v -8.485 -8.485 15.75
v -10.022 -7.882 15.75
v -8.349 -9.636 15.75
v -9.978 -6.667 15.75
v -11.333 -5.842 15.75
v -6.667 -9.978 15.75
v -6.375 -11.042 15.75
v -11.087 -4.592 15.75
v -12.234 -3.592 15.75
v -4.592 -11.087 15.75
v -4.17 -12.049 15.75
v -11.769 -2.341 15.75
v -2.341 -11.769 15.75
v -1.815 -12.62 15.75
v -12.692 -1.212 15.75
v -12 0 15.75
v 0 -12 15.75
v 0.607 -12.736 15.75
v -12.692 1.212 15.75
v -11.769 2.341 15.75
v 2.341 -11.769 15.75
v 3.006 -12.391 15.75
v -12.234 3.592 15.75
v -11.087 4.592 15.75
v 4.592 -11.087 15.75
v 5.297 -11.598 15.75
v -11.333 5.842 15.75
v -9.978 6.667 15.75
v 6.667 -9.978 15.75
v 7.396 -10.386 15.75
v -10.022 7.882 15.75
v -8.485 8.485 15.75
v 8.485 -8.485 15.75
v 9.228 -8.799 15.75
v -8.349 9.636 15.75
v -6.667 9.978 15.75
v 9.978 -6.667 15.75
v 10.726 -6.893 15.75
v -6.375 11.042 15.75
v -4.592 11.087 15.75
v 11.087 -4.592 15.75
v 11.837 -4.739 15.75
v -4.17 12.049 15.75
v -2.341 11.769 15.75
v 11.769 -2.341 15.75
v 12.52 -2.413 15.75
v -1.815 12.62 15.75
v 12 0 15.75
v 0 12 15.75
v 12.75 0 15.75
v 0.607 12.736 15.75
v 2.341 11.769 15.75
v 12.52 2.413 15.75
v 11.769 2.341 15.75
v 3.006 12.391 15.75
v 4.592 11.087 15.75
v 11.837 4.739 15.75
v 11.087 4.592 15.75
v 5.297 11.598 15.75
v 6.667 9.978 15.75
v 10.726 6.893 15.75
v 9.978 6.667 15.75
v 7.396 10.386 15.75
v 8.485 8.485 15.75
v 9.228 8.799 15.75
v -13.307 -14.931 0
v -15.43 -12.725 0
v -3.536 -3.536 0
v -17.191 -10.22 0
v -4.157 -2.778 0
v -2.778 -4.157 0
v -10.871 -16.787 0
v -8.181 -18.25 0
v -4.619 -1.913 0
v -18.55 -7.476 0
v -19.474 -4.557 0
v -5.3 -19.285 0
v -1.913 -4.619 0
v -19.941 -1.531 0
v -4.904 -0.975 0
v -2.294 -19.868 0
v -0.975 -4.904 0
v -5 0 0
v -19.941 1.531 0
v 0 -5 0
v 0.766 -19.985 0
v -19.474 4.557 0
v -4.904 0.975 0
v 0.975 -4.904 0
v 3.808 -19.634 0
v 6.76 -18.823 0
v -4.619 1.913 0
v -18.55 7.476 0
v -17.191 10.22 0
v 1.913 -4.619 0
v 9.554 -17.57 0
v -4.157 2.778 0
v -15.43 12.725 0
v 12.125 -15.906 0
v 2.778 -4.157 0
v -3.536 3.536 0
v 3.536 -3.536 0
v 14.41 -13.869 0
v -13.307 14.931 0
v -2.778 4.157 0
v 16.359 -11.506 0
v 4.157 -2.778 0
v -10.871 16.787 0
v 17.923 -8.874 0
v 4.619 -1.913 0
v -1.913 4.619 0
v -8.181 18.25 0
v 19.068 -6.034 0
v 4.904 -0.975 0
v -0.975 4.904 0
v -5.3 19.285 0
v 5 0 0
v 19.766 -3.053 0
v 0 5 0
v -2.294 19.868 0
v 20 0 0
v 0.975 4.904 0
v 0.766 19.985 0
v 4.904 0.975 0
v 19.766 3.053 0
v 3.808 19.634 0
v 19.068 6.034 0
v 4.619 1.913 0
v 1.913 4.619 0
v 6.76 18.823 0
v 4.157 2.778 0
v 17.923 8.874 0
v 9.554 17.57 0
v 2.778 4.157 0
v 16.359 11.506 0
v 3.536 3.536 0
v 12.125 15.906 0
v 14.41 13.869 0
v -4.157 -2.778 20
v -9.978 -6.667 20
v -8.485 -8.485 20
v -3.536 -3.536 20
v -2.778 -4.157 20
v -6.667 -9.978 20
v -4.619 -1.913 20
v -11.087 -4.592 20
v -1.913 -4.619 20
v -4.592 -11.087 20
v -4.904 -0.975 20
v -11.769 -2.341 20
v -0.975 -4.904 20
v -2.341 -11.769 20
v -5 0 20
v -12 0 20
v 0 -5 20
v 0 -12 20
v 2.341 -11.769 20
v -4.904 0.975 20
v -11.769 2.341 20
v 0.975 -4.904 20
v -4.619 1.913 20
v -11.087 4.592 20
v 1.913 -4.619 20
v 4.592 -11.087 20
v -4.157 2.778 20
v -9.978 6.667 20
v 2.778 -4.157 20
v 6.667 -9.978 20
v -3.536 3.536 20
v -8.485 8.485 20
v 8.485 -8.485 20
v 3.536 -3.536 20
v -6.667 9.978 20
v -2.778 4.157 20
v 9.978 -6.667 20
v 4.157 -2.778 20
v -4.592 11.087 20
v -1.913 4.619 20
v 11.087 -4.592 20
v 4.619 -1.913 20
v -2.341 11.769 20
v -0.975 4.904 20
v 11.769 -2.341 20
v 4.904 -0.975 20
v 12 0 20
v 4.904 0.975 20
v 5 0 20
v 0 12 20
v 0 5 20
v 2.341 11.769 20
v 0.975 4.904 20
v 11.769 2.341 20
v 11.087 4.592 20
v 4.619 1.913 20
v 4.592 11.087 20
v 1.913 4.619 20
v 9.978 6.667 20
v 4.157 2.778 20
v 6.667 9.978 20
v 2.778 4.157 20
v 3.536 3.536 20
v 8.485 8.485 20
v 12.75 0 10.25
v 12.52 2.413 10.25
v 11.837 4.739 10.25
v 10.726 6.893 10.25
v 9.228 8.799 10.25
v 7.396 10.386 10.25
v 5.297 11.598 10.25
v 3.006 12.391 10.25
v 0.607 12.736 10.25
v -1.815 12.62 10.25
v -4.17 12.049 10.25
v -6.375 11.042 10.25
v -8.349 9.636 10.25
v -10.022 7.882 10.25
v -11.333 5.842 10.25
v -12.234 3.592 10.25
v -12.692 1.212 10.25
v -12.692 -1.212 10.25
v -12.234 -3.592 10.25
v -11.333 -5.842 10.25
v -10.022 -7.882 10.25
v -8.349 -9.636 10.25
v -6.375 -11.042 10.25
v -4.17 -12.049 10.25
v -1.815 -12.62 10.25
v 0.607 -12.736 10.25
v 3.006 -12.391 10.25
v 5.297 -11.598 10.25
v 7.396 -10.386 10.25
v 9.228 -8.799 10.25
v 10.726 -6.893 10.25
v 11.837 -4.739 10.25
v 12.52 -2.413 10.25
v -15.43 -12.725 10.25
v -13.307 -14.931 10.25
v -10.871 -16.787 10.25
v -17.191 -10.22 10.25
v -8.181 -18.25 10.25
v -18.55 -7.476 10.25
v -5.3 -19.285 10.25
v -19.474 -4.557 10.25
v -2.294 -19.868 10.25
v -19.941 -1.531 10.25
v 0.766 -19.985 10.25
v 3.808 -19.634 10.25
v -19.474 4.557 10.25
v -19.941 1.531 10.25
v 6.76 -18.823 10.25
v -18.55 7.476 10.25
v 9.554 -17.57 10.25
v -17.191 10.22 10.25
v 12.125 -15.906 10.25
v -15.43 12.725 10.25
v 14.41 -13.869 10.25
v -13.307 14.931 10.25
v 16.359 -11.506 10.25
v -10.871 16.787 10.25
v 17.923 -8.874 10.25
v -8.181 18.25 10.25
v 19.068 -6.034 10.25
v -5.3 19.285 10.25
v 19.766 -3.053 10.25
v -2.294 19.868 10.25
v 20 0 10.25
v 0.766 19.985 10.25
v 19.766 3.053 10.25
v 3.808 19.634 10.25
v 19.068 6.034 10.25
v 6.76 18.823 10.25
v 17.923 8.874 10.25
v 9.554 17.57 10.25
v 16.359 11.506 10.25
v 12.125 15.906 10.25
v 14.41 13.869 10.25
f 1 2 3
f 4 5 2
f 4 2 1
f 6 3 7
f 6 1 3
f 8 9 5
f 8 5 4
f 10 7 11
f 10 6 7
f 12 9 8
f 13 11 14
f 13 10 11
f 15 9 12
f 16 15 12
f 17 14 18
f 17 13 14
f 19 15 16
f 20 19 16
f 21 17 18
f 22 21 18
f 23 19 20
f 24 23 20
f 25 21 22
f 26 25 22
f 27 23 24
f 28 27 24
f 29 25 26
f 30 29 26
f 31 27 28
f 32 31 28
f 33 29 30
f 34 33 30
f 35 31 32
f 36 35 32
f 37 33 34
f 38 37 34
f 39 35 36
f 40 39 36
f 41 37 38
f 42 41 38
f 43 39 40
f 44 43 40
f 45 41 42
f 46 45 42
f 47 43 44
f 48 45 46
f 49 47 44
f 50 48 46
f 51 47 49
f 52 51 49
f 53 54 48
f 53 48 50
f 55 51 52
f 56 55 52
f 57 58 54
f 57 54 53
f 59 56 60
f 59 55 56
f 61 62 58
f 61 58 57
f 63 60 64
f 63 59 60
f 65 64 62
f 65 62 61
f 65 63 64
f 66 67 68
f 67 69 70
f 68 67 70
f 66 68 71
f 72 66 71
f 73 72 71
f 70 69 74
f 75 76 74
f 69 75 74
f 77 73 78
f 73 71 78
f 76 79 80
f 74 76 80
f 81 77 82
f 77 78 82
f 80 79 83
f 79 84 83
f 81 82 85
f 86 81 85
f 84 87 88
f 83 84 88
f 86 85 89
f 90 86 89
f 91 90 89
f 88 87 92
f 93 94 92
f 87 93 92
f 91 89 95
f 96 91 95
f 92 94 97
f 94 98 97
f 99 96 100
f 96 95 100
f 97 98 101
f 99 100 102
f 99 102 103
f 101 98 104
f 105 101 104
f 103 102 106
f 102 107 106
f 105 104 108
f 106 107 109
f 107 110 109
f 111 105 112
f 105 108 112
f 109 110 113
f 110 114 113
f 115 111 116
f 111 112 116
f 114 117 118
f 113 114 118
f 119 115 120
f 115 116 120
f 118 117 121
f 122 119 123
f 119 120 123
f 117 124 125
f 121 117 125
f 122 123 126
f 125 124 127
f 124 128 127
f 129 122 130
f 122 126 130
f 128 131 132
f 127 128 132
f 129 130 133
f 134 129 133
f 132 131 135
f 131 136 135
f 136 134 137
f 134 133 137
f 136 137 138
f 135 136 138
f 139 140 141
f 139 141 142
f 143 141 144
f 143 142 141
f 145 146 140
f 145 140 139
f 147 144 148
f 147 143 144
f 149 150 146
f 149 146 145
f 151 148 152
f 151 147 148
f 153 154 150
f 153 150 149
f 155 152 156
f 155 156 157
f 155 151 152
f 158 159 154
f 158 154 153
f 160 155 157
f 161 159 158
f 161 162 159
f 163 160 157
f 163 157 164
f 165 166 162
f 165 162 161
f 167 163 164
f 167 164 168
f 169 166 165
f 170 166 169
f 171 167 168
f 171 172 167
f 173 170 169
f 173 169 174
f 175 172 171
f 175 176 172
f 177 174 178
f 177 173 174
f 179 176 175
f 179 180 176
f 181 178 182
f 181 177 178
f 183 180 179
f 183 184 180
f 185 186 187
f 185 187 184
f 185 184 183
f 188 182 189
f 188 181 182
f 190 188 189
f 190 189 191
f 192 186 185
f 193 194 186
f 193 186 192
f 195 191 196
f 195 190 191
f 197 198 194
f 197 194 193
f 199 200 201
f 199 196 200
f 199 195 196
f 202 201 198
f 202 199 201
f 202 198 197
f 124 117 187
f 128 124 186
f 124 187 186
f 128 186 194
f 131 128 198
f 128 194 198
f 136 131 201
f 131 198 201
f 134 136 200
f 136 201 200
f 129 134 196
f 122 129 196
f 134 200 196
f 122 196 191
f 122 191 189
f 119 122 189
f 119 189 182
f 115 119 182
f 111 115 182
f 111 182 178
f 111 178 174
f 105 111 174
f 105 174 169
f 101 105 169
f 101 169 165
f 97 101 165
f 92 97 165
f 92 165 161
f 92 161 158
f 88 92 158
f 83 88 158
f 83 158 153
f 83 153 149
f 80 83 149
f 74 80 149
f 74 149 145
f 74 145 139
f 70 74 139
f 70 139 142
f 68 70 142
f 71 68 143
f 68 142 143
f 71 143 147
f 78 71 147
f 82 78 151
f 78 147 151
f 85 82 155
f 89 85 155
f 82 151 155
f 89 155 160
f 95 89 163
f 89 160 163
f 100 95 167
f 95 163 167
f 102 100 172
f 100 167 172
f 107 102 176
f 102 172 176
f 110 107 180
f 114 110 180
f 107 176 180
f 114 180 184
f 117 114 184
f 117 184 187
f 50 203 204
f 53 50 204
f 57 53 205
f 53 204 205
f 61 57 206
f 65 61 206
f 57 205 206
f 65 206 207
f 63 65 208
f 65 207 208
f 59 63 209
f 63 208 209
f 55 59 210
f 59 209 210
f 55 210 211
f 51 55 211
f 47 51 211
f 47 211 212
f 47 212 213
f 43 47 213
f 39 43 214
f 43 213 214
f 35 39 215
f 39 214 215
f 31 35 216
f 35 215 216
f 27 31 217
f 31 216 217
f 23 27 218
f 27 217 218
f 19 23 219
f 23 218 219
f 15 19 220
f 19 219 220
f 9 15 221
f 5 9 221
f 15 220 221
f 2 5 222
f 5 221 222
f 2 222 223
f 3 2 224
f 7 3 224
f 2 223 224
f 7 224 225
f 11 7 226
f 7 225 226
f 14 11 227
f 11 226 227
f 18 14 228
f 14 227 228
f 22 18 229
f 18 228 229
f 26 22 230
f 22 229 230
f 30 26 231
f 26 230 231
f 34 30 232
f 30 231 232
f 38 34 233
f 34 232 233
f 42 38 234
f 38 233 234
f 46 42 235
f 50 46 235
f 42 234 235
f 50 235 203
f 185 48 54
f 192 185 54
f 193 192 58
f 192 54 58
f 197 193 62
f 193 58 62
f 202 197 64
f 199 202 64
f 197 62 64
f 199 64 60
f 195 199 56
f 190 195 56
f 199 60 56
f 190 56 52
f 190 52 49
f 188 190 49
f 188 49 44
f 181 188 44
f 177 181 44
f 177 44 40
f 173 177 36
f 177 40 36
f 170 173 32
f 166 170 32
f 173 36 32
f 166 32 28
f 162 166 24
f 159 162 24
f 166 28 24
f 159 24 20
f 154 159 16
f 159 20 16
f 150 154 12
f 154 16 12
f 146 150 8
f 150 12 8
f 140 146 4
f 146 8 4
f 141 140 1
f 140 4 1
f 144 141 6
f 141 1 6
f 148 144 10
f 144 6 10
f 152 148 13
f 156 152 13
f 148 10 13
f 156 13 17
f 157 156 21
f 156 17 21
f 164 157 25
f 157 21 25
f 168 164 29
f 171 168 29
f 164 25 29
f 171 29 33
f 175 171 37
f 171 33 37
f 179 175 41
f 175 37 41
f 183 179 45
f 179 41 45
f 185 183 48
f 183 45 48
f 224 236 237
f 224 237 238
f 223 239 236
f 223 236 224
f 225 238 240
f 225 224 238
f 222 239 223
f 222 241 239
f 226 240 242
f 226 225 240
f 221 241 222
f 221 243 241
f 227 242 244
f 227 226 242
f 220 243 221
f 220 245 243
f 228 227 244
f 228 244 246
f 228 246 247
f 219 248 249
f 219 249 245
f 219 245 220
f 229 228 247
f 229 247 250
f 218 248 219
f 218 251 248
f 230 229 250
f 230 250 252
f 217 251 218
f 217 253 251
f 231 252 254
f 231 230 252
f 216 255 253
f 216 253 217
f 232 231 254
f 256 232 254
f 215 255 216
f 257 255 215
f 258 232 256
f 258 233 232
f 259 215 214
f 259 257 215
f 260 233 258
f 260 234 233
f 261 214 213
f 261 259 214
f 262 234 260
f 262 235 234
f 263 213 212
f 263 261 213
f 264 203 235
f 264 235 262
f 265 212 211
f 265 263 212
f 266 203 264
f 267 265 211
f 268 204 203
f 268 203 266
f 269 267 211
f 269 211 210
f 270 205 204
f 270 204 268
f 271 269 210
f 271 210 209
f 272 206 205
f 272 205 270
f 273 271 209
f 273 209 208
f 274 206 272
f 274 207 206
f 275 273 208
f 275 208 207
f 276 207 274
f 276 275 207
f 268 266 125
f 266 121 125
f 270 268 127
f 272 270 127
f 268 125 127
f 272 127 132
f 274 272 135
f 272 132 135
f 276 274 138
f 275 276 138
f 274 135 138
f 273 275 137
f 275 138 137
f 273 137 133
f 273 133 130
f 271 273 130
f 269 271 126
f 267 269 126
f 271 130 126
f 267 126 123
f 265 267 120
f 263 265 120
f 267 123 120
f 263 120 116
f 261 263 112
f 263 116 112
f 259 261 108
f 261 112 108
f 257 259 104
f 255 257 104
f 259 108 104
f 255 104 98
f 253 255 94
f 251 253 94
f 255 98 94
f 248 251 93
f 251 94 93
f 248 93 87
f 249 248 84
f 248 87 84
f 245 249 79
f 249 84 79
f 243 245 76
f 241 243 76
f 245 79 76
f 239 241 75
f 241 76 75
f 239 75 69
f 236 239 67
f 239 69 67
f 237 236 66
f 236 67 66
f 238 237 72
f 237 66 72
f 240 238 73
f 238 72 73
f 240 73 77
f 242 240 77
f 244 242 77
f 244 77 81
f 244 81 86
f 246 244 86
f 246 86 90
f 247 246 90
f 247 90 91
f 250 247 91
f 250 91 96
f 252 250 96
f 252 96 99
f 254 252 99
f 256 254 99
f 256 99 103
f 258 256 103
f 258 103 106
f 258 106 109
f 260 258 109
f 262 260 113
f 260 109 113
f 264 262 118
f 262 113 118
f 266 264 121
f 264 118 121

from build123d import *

# Parameters (mm, degrees)
F0_R     = 20
F1_DEPTH = 6
F2_DEPTH = 4.25
F3_R     = 12.75
F4_DEPTH = 5.5
F5_R     = 12
F6_DEPTH = 4.25
F7_R     = 5
F8_DEPTH = 73
F9_DEPTH = 20.001


# Not quite as in the source:
# - an extrude ends at something that could not be found from the text; its depth is read off the source's solid


with BuildPart() as f1:
    # F0 (on Top) → F1 (new body)
    with BuildSketch(Plane.XY):
        Circle(F0_R)
    extrude(amount=F1_DEPTH)

    # F2 (add): a face of the model
    f2_faces = [f1.faces().sort_by_distance(p)[0] for p in [
        (0, 0, 6),
    ]]
    extrude(f2_faces, amount=F2_DEPTH)

    # F3 (on face) → F4 (join)
    with BuildSketch(Plane.XY.offset(10.25)):
        Circle(F3_R)
    extrude(amount=F4_DEPTH)

    # F5 (on face) → F6 (join)
    with BuildSketch(Plane.XY.offset(15.75)):
        Circle(F5_R)
    extrude(amount=F6_DEPTH)

    # F7 (on face) → F8 (cut, through all)
    with BuildSketch(Plane.XY.offset(20)):
        Circle(F7_R)
    extrude(amount=F8_DEPTH, mode=Mode.SUBTRACT)

    # F7 (on face) → F9 (cut, through all)
    with BuildSketch(Plane.XY.offset(20)):
        Circle(F7_R)
    extrude(amount=-F9_DEPTH, mode=Mode.SUBTRACT)


solid = f1.part
